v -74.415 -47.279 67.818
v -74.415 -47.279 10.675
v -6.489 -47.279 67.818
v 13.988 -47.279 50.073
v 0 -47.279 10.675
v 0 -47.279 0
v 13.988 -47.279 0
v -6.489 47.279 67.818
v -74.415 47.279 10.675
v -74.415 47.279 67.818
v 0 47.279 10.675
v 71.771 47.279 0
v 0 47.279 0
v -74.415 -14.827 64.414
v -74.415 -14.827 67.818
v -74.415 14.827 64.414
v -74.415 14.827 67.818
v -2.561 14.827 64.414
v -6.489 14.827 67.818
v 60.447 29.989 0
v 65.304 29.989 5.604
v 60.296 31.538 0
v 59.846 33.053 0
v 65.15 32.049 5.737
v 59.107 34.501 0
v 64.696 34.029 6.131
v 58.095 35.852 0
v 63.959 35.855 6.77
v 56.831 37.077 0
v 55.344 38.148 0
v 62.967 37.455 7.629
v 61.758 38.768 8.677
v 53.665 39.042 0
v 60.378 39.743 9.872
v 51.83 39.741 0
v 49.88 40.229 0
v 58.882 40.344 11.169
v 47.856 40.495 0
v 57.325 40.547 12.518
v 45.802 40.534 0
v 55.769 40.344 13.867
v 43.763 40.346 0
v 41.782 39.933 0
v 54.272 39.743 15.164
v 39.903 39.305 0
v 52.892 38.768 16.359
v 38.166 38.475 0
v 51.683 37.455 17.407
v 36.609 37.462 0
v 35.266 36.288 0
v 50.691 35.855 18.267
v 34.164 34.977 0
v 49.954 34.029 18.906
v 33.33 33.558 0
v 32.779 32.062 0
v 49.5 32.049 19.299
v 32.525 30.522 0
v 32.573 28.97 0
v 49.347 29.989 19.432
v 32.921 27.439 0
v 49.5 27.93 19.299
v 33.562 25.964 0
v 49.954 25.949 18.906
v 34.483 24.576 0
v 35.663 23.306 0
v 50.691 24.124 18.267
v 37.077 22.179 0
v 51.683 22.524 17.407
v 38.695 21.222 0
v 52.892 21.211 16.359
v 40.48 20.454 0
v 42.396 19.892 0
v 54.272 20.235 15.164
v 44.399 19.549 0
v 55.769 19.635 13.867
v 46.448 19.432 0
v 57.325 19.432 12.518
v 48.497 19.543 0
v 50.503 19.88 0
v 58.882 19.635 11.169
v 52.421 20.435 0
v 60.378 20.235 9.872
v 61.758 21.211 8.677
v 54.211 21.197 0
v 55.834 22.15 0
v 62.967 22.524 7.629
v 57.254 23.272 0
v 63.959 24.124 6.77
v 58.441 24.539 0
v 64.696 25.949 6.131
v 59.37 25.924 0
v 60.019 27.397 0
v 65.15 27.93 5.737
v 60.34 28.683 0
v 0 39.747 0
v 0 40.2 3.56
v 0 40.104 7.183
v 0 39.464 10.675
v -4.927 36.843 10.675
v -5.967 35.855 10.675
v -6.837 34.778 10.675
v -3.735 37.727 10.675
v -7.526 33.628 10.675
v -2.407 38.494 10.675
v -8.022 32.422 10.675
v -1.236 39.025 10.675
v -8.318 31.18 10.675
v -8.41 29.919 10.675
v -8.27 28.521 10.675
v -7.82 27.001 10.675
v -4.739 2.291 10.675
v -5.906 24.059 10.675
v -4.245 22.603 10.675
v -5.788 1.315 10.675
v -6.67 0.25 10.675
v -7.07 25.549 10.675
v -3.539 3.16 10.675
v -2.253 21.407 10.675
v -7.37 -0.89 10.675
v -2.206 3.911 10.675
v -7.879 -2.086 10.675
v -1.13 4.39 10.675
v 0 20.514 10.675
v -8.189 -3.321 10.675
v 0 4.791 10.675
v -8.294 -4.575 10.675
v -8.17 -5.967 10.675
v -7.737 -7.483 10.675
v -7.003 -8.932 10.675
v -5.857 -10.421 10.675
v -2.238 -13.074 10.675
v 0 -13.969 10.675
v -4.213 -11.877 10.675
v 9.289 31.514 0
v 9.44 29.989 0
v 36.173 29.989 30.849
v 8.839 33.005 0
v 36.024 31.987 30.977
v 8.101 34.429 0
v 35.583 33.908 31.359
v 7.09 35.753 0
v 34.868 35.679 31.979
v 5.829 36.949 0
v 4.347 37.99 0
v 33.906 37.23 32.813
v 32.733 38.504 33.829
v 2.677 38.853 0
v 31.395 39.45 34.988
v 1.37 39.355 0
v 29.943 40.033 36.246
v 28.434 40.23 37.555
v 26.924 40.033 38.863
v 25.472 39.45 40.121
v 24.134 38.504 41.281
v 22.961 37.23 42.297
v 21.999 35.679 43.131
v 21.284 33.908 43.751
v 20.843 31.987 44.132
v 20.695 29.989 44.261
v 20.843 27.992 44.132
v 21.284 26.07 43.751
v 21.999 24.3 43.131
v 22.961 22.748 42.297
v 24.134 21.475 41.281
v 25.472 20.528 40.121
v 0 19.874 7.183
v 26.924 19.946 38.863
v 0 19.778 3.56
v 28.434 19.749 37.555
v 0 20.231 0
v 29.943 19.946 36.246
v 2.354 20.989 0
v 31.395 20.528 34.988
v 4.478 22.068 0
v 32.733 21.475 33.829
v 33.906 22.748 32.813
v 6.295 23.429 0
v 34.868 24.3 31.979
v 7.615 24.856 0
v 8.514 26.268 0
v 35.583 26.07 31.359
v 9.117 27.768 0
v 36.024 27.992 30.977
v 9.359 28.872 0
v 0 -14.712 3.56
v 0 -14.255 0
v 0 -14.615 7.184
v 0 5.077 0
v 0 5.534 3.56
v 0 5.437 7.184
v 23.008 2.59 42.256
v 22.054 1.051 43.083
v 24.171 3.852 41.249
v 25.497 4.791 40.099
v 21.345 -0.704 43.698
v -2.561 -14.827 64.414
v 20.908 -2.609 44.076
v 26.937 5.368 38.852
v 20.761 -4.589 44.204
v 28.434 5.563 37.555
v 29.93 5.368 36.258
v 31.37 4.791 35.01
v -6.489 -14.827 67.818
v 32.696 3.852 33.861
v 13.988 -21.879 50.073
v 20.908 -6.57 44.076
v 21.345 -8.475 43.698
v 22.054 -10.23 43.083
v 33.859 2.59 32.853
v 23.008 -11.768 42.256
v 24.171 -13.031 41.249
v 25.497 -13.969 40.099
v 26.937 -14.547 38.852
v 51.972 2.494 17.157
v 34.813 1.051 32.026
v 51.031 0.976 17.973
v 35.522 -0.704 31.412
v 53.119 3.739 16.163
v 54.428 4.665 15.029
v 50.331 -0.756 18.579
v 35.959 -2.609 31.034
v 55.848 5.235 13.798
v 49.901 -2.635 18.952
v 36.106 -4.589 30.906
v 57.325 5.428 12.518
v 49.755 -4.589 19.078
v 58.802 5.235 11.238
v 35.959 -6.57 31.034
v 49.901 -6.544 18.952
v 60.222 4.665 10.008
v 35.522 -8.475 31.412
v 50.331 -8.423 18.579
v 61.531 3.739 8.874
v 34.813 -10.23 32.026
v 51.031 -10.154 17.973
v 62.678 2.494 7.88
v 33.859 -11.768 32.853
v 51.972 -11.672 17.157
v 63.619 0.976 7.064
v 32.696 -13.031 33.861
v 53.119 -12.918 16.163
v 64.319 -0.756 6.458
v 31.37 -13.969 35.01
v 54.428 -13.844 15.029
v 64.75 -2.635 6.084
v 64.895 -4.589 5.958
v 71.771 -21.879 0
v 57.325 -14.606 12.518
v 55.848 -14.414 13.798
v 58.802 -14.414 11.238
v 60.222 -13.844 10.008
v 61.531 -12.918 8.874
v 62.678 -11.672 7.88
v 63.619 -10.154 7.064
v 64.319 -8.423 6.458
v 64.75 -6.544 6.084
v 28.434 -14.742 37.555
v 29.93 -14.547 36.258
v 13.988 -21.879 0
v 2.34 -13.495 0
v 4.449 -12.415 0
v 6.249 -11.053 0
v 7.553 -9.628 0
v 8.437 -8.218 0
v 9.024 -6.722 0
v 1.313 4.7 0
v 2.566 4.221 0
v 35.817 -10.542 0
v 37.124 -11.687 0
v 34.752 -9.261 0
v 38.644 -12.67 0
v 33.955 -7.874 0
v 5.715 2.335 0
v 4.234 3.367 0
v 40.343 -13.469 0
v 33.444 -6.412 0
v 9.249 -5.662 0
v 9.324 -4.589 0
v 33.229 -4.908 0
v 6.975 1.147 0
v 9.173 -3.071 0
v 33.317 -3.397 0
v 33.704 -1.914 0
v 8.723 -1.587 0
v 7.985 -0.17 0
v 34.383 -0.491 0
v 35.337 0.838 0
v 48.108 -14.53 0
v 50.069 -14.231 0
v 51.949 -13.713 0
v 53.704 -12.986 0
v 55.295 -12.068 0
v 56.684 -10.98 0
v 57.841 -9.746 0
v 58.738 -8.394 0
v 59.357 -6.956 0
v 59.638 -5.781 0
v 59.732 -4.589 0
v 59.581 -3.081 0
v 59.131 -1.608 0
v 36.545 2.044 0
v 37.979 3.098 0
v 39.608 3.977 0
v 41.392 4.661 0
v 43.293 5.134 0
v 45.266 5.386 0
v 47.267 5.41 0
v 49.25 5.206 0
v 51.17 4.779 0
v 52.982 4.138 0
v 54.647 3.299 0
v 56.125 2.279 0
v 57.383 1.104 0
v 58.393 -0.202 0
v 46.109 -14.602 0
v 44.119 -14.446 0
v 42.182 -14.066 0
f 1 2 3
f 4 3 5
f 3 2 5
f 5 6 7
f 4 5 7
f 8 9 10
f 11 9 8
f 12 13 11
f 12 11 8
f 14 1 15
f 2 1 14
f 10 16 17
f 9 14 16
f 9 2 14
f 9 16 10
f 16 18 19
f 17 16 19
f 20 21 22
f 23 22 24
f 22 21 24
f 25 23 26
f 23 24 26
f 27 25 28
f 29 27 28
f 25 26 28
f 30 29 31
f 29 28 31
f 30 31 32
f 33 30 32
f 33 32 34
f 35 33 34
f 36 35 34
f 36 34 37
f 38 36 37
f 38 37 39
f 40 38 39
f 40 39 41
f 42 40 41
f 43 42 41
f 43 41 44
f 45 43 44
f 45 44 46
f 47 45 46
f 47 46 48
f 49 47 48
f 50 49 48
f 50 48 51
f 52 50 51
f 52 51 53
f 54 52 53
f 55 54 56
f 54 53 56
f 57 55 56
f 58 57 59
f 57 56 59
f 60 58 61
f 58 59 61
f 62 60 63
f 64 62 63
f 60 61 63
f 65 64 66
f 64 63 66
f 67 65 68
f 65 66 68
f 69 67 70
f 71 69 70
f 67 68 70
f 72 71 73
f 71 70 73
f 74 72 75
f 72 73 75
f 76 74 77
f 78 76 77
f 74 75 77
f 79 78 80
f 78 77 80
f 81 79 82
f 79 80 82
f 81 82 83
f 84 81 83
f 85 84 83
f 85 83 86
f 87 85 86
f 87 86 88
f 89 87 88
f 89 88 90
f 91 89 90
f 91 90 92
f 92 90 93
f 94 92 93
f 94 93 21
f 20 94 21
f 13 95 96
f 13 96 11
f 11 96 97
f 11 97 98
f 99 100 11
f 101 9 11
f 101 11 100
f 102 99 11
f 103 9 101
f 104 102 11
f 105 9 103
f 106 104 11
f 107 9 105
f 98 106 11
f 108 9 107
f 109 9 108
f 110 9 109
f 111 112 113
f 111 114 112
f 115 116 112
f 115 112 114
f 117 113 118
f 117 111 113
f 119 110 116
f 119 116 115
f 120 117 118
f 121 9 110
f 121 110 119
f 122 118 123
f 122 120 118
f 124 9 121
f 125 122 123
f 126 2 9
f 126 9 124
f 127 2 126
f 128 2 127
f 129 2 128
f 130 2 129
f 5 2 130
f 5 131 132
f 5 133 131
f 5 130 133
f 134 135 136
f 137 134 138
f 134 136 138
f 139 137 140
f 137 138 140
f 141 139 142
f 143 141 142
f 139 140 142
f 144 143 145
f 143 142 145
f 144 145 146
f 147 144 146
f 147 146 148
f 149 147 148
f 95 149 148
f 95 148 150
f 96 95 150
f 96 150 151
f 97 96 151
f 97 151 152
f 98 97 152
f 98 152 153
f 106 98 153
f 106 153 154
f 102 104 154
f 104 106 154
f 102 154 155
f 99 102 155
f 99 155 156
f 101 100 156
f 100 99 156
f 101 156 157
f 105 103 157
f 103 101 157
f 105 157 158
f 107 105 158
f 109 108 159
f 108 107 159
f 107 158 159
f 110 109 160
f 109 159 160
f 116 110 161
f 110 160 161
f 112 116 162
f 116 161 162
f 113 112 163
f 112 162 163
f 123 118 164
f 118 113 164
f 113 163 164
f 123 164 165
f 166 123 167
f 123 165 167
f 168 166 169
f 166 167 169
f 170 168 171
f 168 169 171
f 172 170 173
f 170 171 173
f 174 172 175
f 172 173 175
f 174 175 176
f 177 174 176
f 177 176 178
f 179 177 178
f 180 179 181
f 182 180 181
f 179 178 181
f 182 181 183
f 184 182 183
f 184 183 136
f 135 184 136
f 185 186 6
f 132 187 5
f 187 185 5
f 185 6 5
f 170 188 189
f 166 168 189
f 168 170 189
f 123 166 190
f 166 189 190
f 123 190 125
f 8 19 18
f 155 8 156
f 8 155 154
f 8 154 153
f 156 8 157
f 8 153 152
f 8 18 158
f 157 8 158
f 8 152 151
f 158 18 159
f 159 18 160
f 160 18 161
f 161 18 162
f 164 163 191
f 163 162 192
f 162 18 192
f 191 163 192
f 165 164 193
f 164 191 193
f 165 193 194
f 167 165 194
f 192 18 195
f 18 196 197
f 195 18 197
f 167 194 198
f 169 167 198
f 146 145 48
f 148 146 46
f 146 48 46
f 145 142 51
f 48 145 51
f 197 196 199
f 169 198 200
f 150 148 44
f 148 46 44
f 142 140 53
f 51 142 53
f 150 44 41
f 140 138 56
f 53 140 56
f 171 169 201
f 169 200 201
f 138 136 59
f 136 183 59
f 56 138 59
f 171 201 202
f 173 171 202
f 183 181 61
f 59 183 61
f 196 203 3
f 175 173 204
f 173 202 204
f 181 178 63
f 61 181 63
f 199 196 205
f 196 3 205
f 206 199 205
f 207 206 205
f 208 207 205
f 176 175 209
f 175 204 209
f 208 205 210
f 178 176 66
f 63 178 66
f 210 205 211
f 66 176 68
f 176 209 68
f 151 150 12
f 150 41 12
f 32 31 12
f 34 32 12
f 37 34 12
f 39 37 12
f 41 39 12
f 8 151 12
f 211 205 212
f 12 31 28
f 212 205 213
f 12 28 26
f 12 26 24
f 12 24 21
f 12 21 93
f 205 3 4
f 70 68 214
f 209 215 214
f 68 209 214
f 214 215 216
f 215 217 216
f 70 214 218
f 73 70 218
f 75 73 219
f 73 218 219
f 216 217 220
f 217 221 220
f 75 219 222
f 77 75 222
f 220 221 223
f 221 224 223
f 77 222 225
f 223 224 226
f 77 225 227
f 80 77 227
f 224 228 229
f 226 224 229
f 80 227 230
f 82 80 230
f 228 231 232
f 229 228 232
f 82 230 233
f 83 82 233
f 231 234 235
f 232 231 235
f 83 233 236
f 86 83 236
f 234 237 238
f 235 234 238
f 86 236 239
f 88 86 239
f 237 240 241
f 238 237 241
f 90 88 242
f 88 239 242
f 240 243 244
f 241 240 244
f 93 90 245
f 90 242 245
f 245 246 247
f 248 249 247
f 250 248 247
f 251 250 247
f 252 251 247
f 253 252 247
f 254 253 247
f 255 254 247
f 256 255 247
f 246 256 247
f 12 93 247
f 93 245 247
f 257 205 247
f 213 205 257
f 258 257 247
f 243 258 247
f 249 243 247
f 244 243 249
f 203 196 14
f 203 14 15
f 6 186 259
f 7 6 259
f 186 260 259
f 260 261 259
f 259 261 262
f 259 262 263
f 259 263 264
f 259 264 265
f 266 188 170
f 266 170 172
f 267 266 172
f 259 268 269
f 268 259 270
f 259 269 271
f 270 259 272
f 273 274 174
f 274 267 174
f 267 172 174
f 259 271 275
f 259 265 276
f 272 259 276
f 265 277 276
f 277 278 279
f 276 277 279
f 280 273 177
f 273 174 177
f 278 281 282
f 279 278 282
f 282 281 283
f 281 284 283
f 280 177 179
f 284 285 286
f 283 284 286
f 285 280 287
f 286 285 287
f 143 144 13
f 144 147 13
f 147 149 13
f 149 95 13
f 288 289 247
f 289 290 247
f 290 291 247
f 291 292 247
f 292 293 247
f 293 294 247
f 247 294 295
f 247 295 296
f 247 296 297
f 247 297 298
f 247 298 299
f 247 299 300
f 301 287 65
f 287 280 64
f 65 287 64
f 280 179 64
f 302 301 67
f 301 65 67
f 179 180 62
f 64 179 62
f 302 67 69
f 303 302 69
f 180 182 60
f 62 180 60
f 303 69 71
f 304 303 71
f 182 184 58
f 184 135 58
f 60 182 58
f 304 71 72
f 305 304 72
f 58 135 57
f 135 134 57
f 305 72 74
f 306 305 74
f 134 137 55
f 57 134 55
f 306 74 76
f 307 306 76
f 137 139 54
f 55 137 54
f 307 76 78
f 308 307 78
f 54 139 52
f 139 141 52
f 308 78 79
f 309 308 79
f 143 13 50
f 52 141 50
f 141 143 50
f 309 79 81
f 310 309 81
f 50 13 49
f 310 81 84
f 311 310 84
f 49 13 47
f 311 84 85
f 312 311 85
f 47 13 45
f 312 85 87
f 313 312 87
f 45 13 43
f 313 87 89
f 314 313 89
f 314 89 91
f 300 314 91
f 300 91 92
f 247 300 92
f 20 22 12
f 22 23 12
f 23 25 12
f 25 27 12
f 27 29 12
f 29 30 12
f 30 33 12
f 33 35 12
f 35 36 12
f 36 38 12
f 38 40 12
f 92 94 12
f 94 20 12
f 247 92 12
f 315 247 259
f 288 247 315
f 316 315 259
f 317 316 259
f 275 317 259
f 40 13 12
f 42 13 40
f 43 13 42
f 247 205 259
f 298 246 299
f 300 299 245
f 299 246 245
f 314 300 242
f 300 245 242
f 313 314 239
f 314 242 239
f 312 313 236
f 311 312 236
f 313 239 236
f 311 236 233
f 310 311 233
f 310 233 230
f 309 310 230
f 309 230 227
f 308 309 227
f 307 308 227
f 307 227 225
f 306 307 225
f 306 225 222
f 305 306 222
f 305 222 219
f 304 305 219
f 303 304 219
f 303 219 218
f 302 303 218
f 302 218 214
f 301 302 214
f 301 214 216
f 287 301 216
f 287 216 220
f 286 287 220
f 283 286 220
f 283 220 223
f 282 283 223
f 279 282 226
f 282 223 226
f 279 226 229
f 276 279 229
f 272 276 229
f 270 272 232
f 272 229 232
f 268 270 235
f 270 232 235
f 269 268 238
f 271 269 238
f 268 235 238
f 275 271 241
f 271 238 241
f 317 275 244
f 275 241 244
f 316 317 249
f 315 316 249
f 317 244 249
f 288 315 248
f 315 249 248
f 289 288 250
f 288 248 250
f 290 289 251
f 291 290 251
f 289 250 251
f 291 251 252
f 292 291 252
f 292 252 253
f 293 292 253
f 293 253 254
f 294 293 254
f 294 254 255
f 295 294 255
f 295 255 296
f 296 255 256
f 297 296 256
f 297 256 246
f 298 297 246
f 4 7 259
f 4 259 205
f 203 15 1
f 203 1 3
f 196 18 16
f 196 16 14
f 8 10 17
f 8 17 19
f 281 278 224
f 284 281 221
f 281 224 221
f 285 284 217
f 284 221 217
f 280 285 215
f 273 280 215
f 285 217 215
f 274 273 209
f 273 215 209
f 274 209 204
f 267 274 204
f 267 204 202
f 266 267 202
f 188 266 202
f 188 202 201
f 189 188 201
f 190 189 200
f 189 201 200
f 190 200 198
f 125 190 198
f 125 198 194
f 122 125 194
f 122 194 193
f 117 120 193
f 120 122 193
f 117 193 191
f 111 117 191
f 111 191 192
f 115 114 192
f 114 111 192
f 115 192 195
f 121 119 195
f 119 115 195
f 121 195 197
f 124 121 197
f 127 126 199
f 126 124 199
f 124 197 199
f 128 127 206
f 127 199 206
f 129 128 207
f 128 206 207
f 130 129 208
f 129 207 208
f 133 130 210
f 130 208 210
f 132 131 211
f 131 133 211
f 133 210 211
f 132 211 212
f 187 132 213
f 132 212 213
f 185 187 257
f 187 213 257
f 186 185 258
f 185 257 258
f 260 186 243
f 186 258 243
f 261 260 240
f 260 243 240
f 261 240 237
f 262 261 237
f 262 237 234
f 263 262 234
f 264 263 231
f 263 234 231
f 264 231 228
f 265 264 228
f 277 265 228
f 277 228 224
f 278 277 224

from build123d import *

# Parameters (mm, degrees)
F0_W      = 148.8298028708
F0_H      = 94.5572704077
F1_DEPTH  = 67.818
F3_DEPTH  = 63.5
F4_W      = 77.2124454379
F4_H      = 15.4310404323
F5_DEPTH  = 100.33
F6_W      = 59.3081153929
F6_H      = 62.6651751809
F7_DEPTH  = 25.4
F8_W      = 29.6540576965
F8_H      = 6.8081544653
F9_DEPTH  = 87.122
F10_R     = 10.1527389167
F10_R_2   = 10.0169439882
F10_R_3   = 10.557482782
F10_R_4   = 10.2404194945
F11_DEPTH = 107.696


with BuildPart() as f1:
    # F0 (on Top) → F1 (new body)
    with BuildSketch(Plane.XY):
        Rectangle(F0_W, F0_H)
    extrude(amount=F1_DEPTH)

    # F2 (on Front) → F3 (cut, symmetric)
    with BuildSketch(Plane.XZ):
        Polygon((83.3928560285, 71.8970969319), (-11.1966025054, 71.8970969319), (83.3928560285, -10.0711896084), align=None)
    extrude(amount=F3_DEPTH, both=True, mode=Mode.SUBTRACT)

    # F4 (on face) → F5 (cut)
    with BuildSketch(Plane.XZ.offset(47.2786352038)):
        with Locations((-38.606222719, 2.9596809763)):
            Rectangle(F4_W, F4_H)
    extrude(amount=-F5_DEPTH, mode=Mode.SUBTRACT)

    # F6 (on face) → F7 (cut)
    with BuildSketch(Plane.XZ.offset(47.2786352038)):
        with Locations((43.6418186873, 26.5767483506)):
            Rectangle(F6_W, F6_H)
    extrude(amount=-F7_DEPTH, mode=Mode.SUBTRACT)

    # F8 (on face) → F9 (cut)
    with BuildSketch(Plane(origin=(-74.4149014354, 0, 0), x_dir=(0, -1, 0), z_dir=(-1, 0, 0))):
        with Locations((0, 67.818)):
            Rectangle(F8_W, F8_H)
    extrude(amount=-F9_DEPTH, mode=Mode.SUBTRACT)

    # F10 (on face) → F11 (cut)
    with BuildSketch(Plane(origin=(30.781032969, 0, 35.5205819779), x_dir=(0.7557256351, 0, -0.6548883603), z_dir=(0.6548883603, 0, 0.7557256351))):
        with Locations((-3.1062552259, -4.5893176019)):
            Circle(F10_R)
        with Locations((35.1240087858, -4.5893176019)):
            Circle(F10_R_2)
        with Locations((35.1240087858, 29.9893176019)):
            Circle(F10_R_3)
        with Locations((-3.1062552259, 29.9893176019)):
            Circle(F10_R_4)
    extrude(amount=-F11_DEPTH, mode=Mode.SUBTRACT)


solid = f1.part
